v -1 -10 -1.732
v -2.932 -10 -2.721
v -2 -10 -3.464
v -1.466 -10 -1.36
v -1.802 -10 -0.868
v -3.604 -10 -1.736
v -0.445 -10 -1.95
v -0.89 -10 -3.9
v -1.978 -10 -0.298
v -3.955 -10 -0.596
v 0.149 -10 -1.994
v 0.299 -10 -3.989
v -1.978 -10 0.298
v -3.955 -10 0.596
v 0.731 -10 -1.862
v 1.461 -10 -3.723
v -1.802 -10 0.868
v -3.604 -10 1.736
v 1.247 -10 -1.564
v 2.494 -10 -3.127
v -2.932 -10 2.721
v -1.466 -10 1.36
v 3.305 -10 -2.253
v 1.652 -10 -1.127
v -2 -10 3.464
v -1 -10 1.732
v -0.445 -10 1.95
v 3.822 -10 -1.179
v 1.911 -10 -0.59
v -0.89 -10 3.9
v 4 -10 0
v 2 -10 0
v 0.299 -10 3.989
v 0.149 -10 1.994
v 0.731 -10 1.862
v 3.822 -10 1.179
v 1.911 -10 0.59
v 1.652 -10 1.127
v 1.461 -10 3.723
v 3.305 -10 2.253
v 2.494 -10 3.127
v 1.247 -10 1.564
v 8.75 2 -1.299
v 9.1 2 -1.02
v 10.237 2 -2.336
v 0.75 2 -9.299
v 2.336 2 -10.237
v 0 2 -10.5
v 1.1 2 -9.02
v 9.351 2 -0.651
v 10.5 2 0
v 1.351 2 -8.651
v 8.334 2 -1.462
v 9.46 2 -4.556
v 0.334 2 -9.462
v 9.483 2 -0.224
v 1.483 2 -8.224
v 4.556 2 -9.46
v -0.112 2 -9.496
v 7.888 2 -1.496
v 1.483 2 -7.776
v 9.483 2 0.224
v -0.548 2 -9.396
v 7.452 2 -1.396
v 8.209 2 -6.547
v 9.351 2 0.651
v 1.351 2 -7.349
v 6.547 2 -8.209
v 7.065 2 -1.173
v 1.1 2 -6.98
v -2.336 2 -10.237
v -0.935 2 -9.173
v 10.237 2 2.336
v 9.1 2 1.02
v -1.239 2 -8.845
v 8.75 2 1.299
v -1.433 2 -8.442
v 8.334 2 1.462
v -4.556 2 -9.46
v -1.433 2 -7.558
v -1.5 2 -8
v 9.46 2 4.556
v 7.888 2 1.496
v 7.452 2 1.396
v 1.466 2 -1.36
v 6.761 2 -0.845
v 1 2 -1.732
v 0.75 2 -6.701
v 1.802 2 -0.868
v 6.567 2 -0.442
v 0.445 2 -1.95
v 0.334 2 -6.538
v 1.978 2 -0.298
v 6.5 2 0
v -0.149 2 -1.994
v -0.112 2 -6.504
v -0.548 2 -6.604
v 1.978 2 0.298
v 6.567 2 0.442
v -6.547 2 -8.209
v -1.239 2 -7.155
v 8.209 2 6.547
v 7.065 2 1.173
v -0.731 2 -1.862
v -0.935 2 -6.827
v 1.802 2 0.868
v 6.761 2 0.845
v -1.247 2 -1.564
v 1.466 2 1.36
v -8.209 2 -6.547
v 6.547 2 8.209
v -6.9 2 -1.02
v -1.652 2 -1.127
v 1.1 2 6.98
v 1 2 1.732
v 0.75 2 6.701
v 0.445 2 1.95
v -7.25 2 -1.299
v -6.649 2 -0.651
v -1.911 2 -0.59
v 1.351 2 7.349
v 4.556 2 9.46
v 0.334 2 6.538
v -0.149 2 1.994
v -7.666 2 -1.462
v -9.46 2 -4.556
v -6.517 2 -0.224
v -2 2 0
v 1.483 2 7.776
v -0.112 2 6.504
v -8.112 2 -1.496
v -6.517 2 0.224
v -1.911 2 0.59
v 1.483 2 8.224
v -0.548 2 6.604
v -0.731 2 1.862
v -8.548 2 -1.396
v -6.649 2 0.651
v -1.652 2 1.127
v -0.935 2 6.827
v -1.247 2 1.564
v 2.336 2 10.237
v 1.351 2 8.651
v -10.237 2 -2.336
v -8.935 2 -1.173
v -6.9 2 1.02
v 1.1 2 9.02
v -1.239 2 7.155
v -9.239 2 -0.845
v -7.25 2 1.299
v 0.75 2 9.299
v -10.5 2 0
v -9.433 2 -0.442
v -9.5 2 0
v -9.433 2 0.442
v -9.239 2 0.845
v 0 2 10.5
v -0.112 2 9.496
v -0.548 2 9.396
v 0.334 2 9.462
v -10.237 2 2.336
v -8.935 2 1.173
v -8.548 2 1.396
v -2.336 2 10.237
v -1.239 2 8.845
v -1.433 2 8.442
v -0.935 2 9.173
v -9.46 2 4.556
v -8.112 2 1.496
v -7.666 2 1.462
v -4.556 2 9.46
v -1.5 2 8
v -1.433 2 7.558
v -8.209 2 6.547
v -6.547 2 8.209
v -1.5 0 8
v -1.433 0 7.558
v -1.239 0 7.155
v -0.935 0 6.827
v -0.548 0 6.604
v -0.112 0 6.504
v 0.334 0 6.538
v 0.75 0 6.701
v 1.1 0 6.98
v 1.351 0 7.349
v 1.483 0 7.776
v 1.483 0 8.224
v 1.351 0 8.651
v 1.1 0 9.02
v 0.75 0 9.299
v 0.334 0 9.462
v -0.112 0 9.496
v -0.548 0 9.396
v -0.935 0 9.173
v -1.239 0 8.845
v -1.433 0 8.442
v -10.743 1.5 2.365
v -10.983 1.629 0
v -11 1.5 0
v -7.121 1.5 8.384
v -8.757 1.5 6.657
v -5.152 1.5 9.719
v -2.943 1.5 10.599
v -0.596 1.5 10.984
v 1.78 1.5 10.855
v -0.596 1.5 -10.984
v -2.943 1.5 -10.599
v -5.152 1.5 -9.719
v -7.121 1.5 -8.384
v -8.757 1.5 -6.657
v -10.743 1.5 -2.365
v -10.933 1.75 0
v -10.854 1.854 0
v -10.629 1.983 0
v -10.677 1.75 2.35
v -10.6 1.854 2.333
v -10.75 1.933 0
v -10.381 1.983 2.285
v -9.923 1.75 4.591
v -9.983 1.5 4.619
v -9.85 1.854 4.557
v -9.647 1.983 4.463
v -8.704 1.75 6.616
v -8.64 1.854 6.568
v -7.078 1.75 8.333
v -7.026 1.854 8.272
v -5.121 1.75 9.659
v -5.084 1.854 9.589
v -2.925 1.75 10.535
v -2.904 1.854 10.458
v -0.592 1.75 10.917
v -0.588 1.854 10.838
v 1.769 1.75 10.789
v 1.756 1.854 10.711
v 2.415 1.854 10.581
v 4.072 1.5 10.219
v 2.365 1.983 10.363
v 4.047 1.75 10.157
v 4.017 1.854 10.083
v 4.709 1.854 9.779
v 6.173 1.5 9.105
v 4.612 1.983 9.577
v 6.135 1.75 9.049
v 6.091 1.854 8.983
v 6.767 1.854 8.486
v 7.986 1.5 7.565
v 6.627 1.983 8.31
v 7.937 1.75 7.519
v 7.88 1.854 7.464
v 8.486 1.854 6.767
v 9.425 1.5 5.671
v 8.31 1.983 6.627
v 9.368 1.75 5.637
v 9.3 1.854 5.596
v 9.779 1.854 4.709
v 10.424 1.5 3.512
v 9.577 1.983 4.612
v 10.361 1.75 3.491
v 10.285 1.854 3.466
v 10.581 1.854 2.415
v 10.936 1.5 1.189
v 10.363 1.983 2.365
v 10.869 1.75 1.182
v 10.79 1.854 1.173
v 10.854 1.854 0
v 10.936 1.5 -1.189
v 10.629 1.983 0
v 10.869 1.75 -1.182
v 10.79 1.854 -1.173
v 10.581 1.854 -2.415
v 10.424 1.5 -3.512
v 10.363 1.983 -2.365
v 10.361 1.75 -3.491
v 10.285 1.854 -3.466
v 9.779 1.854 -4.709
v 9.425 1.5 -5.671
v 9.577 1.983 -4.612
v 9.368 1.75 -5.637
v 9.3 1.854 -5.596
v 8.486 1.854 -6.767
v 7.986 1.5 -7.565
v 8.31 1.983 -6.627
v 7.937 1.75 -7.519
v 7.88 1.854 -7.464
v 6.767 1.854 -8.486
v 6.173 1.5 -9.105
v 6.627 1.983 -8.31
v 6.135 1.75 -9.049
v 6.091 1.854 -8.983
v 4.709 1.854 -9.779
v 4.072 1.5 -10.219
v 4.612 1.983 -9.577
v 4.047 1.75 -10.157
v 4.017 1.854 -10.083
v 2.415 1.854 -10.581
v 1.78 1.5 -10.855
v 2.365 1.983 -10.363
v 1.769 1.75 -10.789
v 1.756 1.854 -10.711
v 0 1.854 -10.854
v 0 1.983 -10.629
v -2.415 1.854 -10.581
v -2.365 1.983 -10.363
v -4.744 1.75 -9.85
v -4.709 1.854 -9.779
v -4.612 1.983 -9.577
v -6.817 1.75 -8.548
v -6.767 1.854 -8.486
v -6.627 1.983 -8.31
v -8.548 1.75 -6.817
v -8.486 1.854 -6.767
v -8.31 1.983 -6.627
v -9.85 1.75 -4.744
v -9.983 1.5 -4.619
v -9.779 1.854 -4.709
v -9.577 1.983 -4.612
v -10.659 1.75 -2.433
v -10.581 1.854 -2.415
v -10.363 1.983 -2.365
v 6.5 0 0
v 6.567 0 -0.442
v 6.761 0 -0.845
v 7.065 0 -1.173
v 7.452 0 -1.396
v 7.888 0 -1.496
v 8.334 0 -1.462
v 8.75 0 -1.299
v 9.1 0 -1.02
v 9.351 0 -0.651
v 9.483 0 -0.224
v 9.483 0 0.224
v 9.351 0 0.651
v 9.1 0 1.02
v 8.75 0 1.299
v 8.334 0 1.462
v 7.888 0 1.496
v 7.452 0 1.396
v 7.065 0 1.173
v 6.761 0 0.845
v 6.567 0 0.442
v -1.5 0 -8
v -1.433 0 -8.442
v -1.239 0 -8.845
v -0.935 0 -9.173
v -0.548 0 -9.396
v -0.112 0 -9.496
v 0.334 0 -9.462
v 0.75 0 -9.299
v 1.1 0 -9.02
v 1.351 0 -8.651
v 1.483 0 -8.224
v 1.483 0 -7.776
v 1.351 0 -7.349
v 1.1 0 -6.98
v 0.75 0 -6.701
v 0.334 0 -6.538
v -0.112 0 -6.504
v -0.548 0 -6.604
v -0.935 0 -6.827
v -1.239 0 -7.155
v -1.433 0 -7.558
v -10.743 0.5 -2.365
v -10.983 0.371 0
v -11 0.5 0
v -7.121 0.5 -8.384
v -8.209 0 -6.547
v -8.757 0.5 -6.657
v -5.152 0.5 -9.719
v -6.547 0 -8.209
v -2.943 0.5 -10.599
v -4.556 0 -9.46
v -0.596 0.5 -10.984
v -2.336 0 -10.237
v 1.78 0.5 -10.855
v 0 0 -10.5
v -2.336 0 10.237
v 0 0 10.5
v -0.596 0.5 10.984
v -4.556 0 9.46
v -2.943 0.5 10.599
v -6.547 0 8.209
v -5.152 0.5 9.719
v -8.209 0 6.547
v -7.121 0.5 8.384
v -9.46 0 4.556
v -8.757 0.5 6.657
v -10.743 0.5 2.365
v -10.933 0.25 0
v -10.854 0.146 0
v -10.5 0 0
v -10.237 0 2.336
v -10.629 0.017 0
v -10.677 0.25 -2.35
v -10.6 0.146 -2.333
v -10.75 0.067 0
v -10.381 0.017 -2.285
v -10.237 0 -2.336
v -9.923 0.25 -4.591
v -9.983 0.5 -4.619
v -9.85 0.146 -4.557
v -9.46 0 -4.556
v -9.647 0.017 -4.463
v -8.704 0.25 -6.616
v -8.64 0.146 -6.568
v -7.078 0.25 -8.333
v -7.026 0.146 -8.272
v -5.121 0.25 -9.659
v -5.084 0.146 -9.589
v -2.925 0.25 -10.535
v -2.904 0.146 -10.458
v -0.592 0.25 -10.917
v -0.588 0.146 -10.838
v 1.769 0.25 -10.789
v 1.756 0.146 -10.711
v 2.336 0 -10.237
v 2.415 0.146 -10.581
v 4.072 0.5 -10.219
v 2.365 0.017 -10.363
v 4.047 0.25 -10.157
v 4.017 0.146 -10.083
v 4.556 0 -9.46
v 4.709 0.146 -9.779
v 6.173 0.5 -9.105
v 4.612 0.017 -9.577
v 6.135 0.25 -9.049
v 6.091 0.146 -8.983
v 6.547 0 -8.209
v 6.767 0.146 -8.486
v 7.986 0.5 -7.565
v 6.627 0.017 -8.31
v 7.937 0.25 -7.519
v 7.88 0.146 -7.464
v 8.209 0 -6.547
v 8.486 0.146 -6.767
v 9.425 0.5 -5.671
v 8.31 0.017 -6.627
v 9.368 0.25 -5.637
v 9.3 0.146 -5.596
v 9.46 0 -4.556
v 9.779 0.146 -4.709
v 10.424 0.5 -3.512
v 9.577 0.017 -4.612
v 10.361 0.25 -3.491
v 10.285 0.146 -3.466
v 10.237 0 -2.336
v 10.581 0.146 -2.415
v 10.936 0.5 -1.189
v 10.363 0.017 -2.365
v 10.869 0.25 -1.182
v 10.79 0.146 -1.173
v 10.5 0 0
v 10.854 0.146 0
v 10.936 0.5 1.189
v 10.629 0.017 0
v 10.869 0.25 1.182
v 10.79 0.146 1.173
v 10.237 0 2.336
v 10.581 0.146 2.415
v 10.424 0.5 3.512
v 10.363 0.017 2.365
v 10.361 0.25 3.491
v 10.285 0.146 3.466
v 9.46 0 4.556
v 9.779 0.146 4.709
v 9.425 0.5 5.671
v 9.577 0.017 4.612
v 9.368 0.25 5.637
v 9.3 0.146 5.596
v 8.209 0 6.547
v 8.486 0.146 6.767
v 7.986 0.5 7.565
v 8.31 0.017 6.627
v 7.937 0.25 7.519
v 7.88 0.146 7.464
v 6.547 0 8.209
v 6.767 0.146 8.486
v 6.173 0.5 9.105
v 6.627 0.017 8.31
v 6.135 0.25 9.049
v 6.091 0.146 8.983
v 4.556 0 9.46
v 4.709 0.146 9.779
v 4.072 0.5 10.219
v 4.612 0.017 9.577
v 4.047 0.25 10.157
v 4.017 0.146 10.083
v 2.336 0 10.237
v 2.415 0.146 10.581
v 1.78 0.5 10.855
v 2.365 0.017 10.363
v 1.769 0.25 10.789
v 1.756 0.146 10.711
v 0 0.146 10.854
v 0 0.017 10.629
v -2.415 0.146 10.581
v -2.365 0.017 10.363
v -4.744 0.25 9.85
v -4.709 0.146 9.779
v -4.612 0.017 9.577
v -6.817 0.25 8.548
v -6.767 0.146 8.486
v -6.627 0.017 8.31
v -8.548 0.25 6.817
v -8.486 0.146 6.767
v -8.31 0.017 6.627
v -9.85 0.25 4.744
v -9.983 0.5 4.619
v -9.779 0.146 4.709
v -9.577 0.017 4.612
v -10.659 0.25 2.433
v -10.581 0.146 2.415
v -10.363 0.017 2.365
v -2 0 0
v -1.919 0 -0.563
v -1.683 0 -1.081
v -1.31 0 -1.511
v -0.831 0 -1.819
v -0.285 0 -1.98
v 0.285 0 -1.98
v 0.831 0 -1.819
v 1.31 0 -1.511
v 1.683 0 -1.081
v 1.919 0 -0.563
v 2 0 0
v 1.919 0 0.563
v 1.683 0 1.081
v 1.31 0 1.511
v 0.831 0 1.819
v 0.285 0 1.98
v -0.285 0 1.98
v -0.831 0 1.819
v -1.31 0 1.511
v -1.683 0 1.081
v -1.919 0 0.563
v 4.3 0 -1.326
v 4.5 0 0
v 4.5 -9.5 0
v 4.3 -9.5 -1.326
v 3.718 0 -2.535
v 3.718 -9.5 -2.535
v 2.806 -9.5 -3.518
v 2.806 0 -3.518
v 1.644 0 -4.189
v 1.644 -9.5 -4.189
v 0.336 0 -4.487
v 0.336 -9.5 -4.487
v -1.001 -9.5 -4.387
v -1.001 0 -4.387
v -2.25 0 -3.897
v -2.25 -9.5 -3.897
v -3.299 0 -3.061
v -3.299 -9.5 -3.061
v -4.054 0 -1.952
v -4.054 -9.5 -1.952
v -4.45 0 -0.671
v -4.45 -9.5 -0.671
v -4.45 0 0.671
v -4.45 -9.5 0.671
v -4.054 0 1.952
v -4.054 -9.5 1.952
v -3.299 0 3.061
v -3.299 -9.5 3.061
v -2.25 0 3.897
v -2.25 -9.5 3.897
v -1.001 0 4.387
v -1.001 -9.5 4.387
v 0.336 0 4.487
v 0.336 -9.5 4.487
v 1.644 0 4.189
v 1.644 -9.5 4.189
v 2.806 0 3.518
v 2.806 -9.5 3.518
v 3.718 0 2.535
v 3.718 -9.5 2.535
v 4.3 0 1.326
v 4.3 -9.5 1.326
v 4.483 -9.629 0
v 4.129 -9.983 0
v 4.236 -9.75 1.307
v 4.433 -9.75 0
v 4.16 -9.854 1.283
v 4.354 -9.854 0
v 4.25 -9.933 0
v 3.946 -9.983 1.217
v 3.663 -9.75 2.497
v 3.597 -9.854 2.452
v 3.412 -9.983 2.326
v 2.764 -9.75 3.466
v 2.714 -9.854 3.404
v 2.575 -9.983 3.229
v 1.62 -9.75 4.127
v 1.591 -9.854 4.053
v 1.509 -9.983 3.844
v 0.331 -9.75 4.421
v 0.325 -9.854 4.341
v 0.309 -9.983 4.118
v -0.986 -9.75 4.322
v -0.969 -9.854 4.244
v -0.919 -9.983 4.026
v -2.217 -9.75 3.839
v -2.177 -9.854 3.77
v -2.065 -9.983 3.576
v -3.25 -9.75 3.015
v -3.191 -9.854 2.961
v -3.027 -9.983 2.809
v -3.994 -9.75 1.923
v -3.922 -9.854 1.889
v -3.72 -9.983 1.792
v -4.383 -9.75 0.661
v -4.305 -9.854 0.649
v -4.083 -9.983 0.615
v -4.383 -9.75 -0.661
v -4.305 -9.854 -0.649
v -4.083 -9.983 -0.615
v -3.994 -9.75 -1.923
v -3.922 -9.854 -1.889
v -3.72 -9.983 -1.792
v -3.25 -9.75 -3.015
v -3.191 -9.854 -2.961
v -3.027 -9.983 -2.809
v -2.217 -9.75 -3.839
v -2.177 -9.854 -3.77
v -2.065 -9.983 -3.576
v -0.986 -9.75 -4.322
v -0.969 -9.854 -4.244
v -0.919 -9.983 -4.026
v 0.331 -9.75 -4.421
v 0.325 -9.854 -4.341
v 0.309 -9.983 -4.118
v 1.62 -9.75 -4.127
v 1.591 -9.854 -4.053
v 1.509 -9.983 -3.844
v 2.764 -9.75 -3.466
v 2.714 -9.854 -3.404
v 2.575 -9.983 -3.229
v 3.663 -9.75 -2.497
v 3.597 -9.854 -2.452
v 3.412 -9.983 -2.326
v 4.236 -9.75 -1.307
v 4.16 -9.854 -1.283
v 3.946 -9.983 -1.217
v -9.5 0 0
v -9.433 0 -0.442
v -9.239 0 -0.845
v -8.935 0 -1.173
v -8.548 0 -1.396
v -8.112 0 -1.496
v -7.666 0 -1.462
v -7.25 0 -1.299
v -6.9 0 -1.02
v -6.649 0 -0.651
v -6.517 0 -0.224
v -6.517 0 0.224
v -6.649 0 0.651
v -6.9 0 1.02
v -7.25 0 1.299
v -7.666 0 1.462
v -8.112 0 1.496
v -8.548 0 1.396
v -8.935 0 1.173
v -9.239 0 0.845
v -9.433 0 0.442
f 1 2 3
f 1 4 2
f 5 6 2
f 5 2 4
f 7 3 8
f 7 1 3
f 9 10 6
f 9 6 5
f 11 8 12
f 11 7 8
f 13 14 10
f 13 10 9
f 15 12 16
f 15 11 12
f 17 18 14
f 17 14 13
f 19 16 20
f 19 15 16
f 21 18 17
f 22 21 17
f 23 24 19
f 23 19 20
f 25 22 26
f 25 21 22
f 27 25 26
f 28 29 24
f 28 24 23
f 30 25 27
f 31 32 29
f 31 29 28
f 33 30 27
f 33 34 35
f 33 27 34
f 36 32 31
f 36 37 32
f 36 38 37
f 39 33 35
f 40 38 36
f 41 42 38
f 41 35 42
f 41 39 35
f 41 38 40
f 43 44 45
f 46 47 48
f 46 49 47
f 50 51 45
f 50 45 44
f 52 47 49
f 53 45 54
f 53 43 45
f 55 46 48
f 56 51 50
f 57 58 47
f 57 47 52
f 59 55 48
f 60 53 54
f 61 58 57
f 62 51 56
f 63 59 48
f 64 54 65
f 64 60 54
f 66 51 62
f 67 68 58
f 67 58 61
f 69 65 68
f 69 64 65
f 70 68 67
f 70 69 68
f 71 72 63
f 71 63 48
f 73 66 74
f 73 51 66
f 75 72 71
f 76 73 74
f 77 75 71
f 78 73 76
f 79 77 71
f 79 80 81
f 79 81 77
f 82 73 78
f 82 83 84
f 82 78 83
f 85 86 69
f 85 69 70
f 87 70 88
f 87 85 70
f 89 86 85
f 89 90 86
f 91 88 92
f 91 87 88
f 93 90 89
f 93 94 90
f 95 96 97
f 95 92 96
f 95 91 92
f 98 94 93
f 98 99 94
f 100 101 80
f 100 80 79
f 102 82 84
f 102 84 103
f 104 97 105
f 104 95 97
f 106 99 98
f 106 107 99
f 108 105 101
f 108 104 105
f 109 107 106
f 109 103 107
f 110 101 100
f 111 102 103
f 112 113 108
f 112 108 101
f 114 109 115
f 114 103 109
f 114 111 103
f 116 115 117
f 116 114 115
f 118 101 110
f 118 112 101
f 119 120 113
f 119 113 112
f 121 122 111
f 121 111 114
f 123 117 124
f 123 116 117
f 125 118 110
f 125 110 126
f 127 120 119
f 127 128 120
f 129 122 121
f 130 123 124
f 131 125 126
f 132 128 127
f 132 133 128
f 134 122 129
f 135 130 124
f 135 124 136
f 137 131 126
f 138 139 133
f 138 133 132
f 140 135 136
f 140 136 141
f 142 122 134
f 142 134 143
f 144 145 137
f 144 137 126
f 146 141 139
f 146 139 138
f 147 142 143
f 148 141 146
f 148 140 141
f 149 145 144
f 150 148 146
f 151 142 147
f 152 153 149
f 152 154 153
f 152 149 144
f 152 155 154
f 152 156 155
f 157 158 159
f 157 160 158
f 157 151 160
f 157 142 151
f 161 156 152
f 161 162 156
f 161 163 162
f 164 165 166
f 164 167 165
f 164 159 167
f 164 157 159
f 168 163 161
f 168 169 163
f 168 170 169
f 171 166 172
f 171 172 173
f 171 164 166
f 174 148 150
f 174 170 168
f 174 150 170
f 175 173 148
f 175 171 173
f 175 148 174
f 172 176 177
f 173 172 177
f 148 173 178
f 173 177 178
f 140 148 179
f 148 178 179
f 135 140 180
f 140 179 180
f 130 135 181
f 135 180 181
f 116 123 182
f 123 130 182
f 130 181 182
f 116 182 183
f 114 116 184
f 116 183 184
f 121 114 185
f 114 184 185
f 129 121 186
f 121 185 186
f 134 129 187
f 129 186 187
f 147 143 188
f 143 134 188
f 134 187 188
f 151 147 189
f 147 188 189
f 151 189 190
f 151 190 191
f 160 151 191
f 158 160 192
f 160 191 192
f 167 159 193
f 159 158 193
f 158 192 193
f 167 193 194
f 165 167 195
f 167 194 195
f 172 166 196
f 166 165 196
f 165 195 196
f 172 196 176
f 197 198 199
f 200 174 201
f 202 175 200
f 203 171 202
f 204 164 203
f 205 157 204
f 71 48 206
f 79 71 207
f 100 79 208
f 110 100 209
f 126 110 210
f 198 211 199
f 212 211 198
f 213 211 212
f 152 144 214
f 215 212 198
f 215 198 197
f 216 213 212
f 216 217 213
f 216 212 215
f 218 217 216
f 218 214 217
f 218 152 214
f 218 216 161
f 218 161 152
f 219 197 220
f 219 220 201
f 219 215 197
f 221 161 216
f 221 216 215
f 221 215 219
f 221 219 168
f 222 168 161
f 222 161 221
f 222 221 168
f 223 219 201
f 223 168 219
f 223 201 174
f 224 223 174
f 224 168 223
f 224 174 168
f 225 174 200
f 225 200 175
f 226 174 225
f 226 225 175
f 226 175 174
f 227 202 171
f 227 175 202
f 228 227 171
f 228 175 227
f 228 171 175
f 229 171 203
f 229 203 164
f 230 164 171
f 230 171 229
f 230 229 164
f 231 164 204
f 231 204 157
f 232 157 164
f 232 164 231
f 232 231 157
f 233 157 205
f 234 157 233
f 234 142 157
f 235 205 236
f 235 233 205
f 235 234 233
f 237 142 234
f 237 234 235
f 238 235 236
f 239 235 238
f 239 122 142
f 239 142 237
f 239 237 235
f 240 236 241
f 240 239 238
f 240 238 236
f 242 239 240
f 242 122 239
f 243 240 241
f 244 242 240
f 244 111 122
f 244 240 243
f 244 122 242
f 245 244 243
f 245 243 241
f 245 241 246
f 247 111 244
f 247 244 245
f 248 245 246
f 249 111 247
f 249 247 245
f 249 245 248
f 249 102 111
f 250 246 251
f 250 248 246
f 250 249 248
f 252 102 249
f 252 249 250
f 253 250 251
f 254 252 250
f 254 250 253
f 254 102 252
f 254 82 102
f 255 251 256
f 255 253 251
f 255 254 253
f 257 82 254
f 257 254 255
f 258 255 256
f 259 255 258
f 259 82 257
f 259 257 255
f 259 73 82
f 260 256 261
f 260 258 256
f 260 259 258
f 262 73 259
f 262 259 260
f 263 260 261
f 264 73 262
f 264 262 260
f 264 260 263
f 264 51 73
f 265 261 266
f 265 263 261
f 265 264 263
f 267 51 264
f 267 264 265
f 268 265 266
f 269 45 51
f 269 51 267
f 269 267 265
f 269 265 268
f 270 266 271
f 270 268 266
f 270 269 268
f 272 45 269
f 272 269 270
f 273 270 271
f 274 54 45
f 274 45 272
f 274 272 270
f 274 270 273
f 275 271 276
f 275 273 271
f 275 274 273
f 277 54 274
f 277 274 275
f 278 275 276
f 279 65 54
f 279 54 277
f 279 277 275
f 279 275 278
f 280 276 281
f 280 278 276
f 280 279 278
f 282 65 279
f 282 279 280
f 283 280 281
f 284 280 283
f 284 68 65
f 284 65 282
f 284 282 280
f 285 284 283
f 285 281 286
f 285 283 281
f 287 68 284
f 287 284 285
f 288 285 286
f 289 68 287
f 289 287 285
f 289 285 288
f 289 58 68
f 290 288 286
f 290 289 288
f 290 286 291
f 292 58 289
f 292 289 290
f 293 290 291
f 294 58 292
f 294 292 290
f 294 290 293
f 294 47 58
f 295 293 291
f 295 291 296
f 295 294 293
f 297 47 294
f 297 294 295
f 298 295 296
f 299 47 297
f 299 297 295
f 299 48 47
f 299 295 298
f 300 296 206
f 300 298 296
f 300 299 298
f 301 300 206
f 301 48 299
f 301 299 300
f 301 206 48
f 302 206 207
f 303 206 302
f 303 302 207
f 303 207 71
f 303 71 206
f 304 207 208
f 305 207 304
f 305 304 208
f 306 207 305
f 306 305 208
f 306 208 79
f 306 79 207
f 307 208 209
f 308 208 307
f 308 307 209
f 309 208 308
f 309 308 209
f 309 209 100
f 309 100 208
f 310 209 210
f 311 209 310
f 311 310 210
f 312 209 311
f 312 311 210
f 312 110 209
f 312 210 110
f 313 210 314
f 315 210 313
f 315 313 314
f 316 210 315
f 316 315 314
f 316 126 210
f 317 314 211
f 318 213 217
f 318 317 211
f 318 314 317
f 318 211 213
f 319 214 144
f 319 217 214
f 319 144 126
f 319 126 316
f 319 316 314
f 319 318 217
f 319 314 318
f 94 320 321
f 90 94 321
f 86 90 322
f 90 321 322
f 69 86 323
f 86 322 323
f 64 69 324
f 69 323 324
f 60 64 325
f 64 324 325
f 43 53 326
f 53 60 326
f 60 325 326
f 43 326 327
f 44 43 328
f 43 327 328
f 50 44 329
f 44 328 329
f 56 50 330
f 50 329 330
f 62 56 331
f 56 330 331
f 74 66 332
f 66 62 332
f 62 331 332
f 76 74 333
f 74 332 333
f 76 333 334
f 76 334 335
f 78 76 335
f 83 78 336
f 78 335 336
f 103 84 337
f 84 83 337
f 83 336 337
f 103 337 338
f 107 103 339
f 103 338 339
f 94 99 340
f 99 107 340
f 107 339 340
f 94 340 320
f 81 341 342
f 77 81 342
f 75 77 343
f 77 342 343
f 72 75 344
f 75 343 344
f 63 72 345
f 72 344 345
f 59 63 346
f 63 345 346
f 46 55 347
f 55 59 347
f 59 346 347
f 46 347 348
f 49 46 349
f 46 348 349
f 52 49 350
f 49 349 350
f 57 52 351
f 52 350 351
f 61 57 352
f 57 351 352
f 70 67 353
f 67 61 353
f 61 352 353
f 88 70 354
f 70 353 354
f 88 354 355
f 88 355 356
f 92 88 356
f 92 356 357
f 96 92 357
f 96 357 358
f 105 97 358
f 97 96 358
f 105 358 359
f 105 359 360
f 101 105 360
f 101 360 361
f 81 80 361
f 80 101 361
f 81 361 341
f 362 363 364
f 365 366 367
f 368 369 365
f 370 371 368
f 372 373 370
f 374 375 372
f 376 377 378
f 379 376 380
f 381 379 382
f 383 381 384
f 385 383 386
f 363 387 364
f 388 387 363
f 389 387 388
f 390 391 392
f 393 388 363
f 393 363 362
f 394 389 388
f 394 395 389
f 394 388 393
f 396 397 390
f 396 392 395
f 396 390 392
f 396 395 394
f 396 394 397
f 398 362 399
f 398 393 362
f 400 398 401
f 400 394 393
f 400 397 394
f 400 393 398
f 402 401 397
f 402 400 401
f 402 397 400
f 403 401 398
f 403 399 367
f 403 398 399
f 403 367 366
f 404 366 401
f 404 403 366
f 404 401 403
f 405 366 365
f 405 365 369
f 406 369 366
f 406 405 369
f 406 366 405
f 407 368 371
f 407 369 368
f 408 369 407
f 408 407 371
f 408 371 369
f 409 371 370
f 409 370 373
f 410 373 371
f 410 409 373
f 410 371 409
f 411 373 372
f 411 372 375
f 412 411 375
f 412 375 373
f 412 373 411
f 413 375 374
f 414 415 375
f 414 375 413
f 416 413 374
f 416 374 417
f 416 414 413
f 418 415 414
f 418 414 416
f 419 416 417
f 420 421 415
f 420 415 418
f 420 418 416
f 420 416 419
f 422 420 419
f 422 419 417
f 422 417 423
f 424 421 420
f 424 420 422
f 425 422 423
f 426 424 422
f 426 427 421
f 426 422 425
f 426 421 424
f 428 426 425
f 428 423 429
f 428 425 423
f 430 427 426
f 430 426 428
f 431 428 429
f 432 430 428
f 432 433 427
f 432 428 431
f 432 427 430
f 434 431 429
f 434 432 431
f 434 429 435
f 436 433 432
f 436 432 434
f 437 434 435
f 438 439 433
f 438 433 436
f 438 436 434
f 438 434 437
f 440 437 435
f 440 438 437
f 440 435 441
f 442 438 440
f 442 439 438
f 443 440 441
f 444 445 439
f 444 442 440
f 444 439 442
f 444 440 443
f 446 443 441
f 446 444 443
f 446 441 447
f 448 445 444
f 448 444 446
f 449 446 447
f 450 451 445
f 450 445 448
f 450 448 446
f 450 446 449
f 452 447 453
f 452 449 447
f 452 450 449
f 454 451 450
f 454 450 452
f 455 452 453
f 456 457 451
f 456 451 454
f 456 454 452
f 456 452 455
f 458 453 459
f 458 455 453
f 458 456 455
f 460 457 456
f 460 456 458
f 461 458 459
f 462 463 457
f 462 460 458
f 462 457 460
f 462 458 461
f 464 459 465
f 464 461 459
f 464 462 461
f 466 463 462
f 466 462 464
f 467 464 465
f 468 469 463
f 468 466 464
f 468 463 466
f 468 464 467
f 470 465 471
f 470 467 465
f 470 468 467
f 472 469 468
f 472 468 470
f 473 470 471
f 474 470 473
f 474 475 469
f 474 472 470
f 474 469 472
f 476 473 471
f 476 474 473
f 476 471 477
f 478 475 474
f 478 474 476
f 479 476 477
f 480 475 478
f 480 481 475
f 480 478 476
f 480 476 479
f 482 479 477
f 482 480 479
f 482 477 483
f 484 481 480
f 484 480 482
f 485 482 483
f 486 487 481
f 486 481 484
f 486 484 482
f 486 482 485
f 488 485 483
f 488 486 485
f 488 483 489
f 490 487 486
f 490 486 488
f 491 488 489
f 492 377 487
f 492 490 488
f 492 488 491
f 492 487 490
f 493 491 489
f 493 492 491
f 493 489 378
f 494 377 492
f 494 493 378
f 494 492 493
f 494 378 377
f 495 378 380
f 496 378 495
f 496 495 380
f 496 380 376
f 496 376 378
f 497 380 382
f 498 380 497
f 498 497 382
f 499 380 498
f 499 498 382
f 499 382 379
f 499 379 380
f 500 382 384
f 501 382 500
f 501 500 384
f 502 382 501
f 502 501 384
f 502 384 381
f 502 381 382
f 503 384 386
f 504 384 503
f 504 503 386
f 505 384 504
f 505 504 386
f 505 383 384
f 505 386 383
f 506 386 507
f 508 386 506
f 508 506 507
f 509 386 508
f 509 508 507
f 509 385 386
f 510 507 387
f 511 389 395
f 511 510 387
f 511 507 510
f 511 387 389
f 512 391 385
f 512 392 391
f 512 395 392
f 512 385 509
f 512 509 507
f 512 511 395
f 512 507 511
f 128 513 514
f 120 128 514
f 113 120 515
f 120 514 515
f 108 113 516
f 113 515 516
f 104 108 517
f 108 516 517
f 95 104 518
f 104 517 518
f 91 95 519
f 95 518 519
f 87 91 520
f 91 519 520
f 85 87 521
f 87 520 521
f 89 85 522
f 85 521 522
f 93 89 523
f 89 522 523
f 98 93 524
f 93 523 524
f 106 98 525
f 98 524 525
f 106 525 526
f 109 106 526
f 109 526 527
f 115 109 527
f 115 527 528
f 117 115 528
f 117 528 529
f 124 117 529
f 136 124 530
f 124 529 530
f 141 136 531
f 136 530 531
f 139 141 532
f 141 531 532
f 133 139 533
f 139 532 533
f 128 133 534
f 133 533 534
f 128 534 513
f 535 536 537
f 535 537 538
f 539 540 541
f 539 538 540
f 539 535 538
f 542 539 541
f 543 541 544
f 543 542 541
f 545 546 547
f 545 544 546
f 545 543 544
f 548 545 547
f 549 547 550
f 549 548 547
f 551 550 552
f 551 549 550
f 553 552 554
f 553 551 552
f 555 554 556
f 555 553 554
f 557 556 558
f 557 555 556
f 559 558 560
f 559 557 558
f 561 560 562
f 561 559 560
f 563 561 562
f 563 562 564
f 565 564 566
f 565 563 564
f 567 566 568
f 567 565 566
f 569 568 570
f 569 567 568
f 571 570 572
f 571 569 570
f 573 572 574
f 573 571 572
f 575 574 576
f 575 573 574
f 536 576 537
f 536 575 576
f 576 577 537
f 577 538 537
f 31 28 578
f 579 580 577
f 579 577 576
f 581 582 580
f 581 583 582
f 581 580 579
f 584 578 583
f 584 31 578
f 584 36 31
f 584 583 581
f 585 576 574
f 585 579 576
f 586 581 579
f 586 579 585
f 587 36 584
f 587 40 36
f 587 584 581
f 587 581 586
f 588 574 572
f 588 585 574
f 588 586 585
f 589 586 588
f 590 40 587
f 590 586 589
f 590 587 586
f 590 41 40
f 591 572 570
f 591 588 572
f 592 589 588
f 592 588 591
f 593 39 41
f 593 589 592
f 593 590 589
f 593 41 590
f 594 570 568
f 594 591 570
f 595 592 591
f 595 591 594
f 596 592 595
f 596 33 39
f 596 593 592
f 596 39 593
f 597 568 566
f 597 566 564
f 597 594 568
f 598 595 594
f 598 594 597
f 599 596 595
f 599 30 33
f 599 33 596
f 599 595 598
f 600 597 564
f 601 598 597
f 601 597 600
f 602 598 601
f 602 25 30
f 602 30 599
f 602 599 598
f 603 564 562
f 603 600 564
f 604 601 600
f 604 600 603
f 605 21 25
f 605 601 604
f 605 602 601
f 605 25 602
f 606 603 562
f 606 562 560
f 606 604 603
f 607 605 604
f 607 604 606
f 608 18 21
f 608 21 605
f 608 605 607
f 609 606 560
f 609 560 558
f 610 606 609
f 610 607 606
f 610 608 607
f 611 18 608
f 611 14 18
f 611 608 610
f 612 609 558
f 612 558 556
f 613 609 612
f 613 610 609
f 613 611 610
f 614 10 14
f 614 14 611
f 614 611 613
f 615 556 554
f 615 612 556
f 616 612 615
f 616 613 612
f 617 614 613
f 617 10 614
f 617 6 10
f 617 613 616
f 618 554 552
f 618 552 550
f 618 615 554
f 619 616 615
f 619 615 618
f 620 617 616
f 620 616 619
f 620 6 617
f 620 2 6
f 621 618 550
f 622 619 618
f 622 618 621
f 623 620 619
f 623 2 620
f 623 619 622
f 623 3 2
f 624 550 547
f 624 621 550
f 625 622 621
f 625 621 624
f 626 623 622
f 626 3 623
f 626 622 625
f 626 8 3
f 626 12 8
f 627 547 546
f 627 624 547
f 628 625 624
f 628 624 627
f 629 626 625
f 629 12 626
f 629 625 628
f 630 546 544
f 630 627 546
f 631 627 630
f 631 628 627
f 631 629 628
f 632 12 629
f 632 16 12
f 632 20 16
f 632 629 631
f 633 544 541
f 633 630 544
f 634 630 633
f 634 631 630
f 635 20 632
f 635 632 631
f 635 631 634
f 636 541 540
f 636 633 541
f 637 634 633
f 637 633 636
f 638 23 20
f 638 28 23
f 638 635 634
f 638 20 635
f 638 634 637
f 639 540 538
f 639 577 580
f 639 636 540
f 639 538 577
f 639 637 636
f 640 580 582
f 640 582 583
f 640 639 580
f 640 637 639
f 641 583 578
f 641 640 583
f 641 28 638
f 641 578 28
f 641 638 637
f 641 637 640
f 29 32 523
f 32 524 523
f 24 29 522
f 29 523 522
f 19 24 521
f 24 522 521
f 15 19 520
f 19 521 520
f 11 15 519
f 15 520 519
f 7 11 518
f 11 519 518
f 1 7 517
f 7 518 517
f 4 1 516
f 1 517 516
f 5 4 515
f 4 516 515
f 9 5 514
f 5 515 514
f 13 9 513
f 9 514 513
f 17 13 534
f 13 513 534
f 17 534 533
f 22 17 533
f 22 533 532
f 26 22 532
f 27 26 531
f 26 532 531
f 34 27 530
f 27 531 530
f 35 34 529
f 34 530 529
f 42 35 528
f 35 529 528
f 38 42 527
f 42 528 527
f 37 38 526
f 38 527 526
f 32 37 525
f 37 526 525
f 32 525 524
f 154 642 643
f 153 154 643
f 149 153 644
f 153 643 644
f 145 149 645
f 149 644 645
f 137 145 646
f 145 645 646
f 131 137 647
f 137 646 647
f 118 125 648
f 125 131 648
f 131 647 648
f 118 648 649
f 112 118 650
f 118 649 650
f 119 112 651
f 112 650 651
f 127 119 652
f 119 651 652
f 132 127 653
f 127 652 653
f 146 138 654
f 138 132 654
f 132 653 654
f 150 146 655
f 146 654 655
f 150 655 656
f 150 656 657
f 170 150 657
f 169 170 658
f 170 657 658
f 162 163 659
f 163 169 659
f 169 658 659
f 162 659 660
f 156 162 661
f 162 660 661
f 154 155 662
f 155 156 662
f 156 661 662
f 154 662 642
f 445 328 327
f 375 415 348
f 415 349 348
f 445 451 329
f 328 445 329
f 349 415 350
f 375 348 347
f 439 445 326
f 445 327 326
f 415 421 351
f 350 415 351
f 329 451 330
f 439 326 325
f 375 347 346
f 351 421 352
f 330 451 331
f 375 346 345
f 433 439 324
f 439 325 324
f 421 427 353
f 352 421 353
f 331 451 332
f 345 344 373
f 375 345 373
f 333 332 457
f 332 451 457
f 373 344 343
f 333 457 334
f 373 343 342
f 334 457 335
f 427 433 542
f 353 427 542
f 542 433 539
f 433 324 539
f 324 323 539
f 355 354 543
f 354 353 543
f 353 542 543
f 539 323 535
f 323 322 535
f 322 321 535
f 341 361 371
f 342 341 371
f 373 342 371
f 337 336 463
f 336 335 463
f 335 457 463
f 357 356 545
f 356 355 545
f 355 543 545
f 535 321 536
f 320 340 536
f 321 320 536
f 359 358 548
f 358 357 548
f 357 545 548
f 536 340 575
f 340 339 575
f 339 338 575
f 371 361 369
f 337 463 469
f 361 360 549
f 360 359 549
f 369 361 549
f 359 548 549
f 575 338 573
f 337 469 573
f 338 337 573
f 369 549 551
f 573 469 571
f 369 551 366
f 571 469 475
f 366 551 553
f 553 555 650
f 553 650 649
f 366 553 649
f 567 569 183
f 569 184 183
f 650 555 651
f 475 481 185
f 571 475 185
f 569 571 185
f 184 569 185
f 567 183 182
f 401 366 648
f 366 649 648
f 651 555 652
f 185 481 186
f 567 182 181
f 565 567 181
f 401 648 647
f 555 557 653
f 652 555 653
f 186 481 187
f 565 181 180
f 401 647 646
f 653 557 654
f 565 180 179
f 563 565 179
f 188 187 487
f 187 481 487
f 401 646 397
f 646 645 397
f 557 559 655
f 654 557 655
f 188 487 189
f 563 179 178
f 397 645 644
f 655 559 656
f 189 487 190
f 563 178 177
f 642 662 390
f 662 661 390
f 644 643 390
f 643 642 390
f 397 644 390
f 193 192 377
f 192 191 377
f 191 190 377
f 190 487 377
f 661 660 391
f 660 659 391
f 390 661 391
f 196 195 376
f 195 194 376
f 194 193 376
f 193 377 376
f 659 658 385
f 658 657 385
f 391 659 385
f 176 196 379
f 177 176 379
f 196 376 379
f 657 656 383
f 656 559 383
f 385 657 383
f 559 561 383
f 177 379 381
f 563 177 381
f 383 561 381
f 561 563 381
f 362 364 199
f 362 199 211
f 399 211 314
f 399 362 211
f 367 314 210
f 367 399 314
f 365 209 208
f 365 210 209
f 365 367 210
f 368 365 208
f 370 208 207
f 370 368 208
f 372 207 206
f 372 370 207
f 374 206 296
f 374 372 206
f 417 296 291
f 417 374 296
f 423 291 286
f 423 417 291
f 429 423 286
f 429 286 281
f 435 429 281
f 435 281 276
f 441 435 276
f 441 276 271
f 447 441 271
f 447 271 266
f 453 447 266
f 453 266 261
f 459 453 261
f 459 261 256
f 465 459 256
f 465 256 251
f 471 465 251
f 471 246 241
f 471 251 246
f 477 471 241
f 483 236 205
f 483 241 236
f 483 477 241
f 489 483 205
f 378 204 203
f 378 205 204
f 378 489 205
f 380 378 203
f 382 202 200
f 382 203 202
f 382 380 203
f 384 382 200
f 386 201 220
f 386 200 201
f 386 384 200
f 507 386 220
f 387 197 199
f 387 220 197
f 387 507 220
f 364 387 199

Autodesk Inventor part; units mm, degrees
ref_plane "YZ Plane" through (0, 0, 0) normal (1, 0, 0) x (0, 1, 0)
ref_plane "XZ Plane" through (0, 0, 0) normal (0, 1, 0) x (-1, 0, 0)
ref_plane "XY Plane" through (0, 0, 0) normal (0, 0, 1) x (1, 0, 0)
sketch "Sketch1" plane through (0, 0, 0) normal (0, 1, 0) x (-1, 0, 0)
  circle A0 centre (0, 0) radius 11
  circle A1 centre (0, 0) radius 2
  circle A2 centre (8, 0) radius 1.5
  circle A3 centre (0, 8) radius 1.5
  circle A4 centre (-8, 0) radius 1.5
  circle A5 centre (0, -8) radius 1.5
  dimension "d0" = 22
  dimension "d1" = 4
  dimension "d2" = 3
  dimension "d3" = 8
  dimension "d6" = 360
extrude "Extrusion1" add sketch "Sketch1" along normal blind 2
fillet "Fillet1" radius 0.5 2 edges at (11, 2, 0) (11, 0, 0)
sketch "Sketch2" plane through (0, 0, 0) normal (0, -1, 0) x (1, 0, 0)
  circle A0 centre (0, 0) radius 2 projected
  circle A1 centre (0, 0) radius 4.5
  dimension "d11" = 9
extrude "Extrusion2" add sketch "Sketch2" along normal blind 10
fillet "Fillet2" radius 0.5 1 edges at (-4.5, -10, 0)
properties part number "WH-Coupling-4mm"
